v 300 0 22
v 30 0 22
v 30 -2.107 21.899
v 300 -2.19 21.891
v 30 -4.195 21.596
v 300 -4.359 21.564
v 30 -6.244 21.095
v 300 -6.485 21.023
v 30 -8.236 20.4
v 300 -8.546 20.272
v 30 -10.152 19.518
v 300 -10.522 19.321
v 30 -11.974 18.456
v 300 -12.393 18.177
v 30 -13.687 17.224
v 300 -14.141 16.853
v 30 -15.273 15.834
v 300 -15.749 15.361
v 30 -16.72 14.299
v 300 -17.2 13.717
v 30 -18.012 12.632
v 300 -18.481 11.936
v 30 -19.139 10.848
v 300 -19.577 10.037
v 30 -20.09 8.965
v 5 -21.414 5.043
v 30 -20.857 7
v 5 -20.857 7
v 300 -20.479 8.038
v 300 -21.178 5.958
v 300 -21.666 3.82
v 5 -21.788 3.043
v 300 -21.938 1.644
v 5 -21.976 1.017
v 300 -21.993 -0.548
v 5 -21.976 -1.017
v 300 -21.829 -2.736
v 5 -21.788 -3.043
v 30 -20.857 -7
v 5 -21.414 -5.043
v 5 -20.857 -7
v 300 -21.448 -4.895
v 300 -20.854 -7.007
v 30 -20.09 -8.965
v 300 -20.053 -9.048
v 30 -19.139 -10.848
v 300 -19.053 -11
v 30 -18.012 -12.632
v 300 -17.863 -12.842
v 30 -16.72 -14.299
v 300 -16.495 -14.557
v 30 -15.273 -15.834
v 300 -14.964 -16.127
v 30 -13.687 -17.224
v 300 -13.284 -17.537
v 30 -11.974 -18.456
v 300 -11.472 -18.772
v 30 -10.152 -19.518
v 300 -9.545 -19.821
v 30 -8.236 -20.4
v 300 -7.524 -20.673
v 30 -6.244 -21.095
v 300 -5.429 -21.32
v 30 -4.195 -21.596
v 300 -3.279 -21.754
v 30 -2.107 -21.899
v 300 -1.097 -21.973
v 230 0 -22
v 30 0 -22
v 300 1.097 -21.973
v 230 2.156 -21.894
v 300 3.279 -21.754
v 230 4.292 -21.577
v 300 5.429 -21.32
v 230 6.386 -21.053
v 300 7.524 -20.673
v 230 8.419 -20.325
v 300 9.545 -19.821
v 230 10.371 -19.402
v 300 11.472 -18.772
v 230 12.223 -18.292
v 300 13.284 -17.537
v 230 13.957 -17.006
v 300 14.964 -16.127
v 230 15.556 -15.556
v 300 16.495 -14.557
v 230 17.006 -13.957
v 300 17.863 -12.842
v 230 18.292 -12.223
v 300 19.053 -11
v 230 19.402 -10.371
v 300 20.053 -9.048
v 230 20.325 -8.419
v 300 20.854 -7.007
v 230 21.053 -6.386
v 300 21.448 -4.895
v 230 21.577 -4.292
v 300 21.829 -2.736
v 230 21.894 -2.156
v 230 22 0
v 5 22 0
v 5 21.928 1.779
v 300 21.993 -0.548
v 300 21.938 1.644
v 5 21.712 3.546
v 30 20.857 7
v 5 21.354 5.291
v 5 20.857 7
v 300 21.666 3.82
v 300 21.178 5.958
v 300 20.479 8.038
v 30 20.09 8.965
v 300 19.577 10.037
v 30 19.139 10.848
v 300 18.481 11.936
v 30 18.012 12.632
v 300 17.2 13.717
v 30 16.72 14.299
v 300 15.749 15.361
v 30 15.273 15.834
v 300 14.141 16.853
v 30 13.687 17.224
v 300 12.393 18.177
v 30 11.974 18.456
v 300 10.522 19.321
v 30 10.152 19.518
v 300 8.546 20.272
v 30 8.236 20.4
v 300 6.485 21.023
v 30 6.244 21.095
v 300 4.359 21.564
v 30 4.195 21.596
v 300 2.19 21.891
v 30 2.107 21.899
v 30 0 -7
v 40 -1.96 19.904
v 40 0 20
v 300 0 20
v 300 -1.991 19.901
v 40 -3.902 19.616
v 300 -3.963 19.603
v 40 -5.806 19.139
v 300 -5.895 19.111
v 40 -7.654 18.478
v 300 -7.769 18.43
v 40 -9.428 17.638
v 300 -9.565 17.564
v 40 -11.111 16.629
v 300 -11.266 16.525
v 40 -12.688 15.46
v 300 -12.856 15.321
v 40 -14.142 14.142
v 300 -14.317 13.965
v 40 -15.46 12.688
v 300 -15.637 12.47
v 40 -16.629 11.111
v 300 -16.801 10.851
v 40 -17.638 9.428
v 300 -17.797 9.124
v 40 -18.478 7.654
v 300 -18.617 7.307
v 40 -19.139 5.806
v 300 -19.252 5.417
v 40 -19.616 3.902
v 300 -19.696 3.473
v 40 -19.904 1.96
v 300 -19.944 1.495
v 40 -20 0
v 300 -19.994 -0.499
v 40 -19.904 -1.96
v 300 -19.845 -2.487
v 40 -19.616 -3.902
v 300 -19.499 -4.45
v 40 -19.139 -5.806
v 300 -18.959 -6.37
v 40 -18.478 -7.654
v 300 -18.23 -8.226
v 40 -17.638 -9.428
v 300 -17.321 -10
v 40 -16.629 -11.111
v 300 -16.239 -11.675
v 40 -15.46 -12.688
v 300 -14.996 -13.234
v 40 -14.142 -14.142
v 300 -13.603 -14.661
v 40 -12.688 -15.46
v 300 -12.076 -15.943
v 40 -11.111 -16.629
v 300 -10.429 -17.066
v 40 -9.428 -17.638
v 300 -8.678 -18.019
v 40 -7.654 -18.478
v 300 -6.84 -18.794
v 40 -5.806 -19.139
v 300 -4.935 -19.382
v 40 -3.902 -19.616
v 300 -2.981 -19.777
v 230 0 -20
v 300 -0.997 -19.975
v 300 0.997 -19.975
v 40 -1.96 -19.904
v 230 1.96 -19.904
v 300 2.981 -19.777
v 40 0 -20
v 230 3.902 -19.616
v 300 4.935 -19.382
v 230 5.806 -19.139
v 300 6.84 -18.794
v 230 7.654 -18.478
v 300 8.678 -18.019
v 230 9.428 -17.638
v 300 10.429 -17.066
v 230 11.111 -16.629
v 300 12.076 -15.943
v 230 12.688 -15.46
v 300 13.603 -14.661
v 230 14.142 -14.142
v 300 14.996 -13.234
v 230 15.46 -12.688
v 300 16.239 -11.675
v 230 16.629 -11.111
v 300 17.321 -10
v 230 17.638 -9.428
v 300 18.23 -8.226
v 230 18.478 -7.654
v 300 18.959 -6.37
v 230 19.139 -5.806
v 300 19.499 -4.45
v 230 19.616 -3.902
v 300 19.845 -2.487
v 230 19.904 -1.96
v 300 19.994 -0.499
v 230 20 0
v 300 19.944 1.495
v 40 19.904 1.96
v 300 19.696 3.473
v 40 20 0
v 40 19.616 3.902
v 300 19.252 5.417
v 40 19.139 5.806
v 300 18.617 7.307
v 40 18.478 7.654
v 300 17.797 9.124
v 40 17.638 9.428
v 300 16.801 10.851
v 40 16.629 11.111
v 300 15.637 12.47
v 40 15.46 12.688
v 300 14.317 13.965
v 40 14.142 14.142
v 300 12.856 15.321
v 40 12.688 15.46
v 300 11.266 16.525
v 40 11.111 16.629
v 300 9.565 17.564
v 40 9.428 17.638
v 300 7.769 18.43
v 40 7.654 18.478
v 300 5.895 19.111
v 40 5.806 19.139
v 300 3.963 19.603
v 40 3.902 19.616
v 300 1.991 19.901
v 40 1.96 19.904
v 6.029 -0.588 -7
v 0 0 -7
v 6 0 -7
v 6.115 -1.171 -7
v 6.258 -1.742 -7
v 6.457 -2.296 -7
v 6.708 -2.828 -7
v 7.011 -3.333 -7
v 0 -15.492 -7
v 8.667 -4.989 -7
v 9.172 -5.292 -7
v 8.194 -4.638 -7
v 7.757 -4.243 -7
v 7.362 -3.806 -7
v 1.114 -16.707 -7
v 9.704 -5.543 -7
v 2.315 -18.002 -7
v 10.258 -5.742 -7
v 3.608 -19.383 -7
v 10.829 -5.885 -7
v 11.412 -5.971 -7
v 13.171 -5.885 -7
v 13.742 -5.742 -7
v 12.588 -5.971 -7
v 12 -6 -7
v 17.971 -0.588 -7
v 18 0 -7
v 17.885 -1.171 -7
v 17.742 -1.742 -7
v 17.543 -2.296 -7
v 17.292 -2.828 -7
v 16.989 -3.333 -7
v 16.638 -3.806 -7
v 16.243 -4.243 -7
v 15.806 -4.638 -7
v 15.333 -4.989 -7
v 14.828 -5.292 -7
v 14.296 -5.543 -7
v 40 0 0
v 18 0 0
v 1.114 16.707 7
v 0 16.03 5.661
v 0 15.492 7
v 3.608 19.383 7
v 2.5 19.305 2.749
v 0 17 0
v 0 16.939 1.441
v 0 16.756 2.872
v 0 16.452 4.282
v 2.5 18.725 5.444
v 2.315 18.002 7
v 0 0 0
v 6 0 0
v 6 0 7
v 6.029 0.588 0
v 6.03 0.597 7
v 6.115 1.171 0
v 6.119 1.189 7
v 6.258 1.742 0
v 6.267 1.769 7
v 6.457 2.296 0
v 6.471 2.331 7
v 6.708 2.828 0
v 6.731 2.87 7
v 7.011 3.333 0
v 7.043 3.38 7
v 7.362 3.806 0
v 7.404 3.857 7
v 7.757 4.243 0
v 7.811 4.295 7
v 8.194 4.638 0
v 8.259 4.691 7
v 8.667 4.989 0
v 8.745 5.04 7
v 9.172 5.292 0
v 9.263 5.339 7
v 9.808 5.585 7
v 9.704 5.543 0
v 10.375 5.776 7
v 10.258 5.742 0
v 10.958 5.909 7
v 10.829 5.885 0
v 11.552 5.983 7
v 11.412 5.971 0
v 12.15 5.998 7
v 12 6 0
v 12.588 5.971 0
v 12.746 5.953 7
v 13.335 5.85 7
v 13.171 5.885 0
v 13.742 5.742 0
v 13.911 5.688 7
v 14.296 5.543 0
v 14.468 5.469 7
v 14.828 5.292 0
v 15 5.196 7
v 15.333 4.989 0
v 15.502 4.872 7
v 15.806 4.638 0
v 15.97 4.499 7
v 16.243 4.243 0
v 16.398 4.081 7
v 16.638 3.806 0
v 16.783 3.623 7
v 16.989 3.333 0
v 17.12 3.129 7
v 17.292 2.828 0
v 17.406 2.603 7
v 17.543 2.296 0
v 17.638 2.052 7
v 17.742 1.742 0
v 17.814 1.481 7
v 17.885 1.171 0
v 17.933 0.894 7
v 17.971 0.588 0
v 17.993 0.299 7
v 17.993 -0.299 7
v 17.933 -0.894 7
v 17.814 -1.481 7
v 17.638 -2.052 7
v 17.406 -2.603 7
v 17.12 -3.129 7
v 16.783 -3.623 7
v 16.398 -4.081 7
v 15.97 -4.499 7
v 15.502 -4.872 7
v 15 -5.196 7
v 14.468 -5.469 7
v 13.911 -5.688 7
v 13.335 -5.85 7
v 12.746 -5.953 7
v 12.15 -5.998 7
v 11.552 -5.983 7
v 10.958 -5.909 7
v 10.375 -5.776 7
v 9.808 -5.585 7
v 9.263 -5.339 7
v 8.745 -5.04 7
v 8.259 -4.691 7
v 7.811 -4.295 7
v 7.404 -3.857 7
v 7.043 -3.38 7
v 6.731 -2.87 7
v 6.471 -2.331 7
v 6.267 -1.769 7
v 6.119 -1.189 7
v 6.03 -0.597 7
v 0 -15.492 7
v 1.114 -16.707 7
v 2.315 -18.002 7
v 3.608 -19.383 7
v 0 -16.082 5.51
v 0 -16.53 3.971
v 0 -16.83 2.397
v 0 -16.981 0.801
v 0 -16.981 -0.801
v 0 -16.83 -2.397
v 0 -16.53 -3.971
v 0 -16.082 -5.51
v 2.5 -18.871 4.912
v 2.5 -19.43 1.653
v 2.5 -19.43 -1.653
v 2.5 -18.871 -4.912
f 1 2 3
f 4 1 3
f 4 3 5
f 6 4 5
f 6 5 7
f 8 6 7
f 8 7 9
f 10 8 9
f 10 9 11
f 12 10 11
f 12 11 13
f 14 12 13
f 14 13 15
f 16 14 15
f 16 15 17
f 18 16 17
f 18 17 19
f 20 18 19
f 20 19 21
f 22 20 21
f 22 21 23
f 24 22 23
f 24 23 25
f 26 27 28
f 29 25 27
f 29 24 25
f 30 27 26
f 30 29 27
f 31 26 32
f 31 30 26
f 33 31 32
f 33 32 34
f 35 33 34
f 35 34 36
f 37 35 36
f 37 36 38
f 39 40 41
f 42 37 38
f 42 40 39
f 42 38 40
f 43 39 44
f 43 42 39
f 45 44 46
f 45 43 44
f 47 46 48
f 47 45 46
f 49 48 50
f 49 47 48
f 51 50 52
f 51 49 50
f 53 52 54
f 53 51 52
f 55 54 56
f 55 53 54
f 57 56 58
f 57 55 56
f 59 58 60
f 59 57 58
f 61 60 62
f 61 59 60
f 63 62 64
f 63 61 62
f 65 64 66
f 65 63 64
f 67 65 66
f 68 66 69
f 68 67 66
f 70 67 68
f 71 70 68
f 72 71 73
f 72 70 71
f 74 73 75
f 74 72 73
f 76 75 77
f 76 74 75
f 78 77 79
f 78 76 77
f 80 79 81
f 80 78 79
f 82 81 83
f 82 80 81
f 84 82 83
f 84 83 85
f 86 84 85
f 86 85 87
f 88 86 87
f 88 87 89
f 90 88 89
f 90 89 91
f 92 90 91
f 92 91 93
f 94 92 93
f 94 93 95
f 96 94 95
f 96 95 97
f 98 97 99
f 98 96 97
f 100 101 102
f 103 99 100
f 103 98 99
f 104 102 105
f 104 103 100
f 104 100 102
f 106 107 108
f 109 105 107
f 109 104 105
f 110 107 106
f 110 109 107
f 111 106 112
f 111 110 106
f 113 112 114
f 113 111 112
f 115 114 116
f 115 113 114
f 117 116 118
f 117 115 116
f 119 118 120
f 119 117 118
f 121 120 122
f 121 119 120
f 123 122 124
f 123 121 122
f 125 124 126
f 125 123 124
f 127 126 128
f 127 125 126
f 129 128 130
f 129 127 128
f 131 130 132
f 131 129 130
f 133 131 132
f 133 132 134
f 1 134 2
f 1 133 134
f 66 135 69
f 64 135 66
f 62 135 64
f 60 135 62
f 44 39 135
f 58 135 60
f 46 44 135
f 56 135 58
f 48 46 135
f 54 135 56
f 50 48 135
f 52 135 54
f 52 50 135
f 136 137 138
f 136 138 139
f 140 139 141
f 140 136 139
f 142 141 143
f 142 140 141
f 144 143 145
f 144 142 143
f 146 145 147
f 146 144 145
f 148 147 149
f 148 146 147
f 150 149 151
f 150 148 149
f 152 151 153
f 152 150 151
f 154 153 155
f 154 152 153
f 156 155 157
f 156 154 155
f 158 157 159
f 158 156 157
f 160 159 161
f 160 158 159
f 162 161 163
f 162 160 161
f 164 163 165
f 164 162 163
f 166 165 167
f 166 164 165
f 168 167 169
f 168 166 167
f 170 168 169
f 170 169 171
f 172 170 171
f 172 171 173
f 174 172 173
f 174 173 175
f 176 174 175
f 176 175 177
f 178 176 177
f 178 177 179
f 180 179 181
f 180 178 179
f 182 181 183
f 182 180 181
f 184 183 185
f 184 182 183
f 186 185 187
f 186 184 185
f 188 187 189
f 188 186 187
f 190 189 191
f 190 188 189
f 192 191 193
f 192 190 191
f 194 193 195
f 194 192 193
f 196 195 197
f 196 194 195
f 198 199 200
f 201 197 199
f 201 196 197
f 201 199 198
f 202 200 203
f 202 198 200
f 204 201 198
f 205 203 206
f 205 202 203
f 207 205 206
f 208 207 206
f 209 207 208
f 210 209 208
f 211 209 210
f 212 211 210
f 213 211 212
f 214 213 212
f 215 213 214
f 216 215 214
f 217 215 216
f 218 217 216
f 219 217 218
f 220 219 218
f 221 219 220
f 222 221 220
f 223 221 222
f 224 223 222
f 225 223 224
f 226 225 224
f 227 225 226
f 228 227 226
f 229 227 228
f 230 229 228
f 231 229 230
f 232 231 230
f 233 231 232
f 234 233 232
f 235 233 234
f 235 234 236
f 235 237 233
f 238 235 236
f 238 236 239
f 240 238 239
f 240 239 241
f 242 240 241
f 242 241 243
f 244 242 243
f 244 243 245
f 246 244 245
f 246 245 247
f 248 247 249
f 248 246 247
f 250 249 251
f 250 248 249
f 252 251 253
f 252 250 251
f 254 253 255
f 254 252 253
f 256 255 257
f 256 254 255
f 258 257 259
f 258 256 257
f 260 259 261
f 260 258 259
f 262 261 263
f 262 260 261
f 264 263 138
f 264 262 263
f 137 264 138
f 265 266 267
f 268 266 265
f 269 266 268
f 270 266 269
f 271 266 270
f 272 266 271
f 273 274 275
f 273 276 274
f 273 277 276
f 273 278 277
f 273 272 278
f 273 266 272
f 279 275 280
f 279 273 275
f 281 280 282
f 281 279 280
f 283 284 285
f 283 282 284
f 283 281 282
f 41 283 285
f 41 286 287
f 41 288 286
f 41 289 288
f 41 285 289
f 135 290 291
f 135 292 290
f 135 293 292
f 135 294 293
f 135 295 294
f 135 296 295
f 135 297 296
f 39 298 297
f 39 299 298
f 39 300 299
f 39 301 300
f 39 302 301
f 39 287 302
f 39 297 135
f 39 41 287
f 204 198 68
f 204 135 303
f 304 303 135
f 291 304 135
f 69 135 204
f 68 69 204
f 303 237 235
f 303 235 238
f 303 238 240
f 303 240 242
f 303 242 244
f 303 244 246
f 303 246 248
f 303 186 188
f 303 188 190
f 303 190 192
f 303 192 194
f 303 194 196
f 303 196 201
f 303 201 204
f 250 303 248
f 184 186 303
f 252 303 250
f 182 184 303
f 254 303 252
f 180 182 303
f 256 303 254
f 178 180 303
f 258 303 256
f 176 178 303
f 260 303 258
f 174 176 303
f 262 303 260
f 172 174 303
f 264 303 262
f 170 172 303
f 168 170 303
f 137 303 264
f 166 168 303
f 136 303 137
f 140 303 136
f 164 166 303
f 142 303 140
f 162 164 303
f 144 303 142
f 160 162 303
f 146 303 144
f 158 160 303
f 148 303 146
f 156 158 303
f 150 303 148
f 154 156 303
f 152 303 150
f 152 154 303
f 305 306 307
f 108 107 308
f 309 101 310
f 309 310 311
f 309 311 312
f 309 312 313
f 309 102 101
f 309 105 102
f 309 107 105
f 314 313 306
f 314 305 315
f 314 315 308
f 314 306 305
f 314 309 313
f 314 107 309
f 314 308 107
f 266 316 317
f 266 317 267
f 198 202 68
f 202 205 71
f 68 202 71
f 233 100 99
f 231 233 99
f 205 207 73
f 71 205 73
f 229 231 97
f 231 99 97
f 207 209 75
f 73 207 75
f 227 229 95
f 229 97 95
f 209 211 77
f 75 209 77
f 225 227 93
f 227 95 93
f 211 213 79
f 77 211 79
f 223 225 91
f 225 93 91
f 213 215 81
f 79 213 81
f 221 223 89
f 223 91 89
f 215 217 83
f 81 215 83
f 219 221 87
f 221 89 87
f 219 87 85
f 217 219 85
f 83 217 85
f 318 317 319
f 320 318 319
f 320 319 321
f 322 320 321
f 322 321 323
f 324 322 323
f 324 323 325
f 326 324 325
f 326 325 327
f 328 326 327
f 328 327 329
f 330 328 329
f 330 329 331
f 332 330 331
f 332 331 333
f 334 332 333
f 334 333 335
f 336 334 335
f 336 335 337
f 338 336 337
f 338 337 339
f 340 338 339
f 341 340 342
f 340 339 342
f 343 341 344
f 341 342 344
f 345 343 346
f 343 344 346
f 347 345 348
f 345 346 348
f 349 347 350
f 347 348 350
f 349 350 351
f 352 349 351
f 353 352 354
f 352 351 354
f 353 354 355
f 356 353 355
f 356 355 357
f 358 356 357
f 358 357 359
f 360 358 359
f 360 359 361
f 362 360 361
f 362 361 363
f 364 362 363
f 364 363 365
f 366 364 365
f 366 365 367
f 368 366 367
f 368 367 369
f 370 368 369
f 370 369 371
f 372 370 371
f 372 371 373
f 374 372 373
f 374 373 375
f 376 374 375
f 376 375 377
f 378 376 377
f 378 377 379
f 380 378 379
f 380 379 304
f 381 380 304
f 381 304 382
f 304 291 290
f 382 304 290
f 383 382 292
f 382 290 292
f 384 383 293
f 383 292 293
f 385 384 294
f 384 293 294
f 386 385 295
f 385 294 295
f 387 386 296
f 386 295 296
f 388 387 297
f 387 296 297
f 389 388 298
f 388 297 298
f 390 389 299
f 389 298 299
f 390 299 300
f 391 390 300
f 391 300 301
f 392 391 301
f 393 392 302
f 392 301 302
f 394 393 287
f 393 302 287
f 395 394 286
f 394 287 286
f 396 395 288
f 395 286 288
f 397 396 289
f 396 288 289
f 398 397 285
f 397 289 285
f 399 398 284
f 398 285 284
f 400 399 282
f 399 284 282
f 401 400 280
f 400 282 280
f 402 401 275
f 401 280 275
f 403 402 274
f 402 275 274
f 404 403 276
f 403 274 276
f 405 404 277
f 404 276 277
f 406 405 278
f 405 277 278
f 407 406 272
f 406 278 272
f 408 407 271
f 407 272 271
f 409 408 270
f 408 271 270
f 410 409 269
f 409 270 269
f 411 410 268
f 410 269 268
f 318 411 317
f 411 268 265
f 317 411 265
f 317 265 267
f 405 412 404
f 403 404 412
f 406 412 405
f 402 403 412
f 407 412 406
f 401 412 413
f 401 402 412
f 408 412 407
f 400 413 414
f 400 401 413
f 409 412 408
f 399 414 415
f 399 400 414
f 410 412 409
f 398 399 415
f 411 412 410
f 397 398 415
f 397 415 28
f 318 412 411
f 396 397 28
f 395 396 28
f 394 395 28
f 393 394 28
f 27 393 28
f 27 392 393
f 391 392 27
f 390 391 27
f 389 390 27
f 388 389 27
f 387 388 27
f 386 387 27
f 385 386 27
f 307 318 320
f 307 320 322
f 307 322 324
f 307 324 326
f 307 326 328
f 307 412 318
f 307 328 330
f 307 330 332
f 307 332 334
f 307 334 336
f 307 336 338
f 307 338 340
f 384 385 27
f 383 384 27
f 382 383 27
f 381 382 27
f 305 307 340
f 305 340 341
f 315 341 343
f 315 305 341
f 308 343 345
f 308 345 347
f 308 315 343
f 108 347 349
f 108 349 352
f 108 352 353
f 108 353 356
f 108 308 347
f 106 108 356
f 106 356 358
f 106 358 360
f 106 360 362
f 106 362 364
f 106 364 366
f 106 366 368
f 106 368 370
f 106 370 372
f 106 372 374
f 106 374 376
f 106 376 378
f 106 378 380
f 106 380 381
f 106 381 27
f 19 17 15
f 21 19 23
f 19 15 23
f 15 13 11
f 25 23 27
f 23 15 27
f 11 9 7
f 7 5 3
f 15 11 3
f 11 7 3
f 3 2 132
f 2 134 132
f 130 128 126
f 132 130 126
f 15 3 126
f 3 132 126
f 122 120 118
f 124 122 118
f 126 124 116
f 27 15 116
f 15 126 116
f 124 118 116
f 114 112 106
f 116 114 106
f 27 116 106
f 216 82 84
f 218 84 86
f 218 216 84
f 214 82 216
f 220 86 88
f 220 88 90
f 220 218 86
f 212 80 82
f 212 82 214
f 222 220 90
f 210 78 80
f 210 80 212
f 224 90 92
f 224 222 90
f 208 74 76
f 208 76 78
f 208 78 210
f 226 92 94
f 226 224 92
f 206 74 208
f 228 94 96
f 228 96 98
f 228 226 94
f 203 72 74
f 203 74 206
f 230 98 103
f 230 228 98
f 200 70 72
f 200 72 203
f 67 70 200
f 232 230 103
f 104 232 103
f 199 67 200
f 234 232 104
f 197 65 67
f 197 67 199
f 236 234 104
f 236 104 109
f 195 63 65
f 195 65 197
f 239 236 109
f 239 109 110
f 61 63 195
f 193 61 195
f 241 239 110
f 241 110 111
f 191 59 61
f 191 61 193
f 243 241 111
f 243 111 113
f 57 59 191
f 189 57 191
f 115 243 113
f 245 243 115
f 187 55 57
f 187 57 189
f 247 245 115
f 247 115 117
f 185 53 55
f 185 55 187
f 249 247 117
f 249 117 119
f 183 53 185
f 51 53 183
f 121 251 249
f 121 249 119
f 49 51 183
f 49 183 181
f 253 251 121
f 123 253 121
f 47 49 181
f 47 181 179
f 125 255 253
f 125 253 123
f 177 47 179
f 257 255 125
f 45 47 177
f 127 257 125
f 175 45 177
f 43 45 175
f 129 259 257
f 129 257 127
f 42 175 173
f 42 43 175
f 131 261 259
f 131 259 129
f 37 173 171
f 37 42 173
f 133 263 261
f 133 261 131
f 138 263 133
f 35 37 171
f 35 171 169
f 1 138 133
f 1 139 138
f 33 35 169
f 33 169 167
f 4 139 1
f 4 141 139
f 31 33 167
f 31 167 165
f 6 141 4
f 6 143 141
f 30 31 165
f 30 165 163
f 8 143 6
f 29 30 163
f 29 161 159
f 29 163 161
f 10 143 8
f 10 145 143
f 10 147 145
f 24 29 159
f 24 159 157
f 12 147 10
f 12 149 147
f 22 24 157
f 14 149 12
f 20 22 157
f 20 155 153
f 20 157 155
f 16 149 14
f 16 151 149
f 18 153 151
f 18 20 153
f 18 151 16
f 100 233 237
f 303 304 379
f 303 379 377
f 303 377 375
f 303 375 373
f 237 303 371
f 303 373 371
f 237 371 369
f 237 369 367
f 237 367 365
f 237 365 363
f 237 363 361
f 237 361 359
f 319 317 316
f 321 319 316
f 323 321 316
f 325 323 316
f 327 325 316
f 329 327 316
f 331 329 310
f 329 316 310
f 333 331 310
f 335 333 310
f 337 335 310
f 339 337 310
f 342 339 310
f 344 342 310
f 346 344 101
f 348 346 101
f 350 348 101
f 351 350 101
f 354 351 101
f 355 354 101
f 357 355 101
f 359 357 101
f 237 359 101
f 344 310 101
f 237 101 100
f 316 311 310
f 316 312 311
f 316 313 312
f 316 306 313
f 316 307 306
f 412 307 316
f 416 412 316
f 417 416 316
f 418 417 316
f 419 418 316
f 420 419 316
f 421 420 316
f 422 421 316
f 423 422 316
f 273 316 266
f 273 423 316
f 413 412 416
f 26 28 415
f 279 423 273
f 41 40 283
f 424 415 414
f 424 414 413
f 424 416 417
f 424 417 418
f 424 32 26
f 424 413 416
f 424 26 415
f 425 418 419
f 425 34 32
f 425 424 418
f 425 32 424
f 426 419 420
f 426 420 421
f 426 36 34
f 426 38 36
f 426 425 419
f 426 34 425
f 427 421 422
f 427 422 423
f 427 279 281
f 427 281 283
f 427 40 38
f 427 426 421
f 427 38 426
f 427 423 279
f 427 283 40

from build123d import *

# Parameters (mm, degrees)
CHANFREIN1_SIZE         = 5
ESQUISSE2_W             = 62.305459945
ESQUISSE2_H             = 30.289532294
ENL_V_MAT_EXTRU_1_DEPTH = 25
ENL_V_MAT_EXTRU_2_REACH = 304.2
ESQUISSE3_R             = 6
ESQUISSE4_W             = 39.235751697
ESQUISSE4_H             = 28.135609998
ENL_V_MAT_EXTRU_3_DEPTH = 230


with BuildPart() as part:
    # Esquisse1 → Révolution1 (revolve)
    with BuildSketch(Plane(origin=(0, 0, 0), x_dir=(1, 0, 0), z_dir=(0, 1, 0)), mode=Mode.PRIVATE) as r_volution1_sk:
        Polygon((0, 0), (0, 22), (300, 22), (300, 20), (40, 20), (40, 0), align=None)
    revolve(r_volution1_sk.sketch.rotate(Axis((0, 0, 0), (1, 0, 0)), 180), axis=Axis((0, 0, 0), (1, 0, 0)))

    # Chanfrein1
    chanfrein1_edges = [part.edges().sort_by_distance(p)[0] for p in [
        (0, 0, -22),
    ]]
    chamfer(chanfrein1_edges, length=CHANFREIN1_SIZE)

    # Esquisse2 → Enlèv. mat.-Extru.1 (cut, symmetric)
    with BuildSketch(Plane(origin=(0, 0, 0), x_dir=(1, 0, 0), z_dir=(0, 1, 0))):
        with Locations((-1.152729972, 22.144766147)):
            Rectangle(ESQUISSE2_W, ESQUISSE2_H)
        with Locations((-1.152729972, -22.144766147)):
            Rectangle(ESQUISSE2_W, ESQUISSE2_H)
    extrude(amount=ENL_V_MAT_EXTRU_1_DEPTH, both=True, mode=Mode.SUBTRACT)

    # Esquisse3 → Enlèv. mat.-Extru.2 (cut, up to next)
    with BuildSketch(Plane(origin=(0, 0, -7), x_dir=(-1, 0, 0), z_dir=(0, 0, -1)), mode=Mode.PRIVATE) as enl_v_mat_extru_2_sk1:
        with Locations((-12, 0)):
            Circle(ESQUISSE3_R)
    enl_v_mat_extru_2_tool1 = extrude(enl_v_mat_extru_2_sk1.sketch, amount=-ENL_V_MAT_EXTRU_2_REACH, mode=Mode.PRIVATE) & part.part
    add(enl_v_mat_extru_2_tool1.solids().sort_by_distance((12, 0, -7))[0], mode=Mode.SUBTRACT)

    # Esquisse4 → Enlèv. mat.-Extru.3 (cut)
    with BuildSketch(Plane(origin=(0, 0, 0), x_dir=(0, 0, -1), z_dir=(1, 0, 0))):
        with Locations((19.617875849, 14.067804999)):
            Rectangle(ESQUISSE4_W, ESQUISSE4_H)
    extrude(amount=ENL_V_MAT_EXTRU_3_DEPTH, mode=Mode.SUBTRACT)


solid = part.part
